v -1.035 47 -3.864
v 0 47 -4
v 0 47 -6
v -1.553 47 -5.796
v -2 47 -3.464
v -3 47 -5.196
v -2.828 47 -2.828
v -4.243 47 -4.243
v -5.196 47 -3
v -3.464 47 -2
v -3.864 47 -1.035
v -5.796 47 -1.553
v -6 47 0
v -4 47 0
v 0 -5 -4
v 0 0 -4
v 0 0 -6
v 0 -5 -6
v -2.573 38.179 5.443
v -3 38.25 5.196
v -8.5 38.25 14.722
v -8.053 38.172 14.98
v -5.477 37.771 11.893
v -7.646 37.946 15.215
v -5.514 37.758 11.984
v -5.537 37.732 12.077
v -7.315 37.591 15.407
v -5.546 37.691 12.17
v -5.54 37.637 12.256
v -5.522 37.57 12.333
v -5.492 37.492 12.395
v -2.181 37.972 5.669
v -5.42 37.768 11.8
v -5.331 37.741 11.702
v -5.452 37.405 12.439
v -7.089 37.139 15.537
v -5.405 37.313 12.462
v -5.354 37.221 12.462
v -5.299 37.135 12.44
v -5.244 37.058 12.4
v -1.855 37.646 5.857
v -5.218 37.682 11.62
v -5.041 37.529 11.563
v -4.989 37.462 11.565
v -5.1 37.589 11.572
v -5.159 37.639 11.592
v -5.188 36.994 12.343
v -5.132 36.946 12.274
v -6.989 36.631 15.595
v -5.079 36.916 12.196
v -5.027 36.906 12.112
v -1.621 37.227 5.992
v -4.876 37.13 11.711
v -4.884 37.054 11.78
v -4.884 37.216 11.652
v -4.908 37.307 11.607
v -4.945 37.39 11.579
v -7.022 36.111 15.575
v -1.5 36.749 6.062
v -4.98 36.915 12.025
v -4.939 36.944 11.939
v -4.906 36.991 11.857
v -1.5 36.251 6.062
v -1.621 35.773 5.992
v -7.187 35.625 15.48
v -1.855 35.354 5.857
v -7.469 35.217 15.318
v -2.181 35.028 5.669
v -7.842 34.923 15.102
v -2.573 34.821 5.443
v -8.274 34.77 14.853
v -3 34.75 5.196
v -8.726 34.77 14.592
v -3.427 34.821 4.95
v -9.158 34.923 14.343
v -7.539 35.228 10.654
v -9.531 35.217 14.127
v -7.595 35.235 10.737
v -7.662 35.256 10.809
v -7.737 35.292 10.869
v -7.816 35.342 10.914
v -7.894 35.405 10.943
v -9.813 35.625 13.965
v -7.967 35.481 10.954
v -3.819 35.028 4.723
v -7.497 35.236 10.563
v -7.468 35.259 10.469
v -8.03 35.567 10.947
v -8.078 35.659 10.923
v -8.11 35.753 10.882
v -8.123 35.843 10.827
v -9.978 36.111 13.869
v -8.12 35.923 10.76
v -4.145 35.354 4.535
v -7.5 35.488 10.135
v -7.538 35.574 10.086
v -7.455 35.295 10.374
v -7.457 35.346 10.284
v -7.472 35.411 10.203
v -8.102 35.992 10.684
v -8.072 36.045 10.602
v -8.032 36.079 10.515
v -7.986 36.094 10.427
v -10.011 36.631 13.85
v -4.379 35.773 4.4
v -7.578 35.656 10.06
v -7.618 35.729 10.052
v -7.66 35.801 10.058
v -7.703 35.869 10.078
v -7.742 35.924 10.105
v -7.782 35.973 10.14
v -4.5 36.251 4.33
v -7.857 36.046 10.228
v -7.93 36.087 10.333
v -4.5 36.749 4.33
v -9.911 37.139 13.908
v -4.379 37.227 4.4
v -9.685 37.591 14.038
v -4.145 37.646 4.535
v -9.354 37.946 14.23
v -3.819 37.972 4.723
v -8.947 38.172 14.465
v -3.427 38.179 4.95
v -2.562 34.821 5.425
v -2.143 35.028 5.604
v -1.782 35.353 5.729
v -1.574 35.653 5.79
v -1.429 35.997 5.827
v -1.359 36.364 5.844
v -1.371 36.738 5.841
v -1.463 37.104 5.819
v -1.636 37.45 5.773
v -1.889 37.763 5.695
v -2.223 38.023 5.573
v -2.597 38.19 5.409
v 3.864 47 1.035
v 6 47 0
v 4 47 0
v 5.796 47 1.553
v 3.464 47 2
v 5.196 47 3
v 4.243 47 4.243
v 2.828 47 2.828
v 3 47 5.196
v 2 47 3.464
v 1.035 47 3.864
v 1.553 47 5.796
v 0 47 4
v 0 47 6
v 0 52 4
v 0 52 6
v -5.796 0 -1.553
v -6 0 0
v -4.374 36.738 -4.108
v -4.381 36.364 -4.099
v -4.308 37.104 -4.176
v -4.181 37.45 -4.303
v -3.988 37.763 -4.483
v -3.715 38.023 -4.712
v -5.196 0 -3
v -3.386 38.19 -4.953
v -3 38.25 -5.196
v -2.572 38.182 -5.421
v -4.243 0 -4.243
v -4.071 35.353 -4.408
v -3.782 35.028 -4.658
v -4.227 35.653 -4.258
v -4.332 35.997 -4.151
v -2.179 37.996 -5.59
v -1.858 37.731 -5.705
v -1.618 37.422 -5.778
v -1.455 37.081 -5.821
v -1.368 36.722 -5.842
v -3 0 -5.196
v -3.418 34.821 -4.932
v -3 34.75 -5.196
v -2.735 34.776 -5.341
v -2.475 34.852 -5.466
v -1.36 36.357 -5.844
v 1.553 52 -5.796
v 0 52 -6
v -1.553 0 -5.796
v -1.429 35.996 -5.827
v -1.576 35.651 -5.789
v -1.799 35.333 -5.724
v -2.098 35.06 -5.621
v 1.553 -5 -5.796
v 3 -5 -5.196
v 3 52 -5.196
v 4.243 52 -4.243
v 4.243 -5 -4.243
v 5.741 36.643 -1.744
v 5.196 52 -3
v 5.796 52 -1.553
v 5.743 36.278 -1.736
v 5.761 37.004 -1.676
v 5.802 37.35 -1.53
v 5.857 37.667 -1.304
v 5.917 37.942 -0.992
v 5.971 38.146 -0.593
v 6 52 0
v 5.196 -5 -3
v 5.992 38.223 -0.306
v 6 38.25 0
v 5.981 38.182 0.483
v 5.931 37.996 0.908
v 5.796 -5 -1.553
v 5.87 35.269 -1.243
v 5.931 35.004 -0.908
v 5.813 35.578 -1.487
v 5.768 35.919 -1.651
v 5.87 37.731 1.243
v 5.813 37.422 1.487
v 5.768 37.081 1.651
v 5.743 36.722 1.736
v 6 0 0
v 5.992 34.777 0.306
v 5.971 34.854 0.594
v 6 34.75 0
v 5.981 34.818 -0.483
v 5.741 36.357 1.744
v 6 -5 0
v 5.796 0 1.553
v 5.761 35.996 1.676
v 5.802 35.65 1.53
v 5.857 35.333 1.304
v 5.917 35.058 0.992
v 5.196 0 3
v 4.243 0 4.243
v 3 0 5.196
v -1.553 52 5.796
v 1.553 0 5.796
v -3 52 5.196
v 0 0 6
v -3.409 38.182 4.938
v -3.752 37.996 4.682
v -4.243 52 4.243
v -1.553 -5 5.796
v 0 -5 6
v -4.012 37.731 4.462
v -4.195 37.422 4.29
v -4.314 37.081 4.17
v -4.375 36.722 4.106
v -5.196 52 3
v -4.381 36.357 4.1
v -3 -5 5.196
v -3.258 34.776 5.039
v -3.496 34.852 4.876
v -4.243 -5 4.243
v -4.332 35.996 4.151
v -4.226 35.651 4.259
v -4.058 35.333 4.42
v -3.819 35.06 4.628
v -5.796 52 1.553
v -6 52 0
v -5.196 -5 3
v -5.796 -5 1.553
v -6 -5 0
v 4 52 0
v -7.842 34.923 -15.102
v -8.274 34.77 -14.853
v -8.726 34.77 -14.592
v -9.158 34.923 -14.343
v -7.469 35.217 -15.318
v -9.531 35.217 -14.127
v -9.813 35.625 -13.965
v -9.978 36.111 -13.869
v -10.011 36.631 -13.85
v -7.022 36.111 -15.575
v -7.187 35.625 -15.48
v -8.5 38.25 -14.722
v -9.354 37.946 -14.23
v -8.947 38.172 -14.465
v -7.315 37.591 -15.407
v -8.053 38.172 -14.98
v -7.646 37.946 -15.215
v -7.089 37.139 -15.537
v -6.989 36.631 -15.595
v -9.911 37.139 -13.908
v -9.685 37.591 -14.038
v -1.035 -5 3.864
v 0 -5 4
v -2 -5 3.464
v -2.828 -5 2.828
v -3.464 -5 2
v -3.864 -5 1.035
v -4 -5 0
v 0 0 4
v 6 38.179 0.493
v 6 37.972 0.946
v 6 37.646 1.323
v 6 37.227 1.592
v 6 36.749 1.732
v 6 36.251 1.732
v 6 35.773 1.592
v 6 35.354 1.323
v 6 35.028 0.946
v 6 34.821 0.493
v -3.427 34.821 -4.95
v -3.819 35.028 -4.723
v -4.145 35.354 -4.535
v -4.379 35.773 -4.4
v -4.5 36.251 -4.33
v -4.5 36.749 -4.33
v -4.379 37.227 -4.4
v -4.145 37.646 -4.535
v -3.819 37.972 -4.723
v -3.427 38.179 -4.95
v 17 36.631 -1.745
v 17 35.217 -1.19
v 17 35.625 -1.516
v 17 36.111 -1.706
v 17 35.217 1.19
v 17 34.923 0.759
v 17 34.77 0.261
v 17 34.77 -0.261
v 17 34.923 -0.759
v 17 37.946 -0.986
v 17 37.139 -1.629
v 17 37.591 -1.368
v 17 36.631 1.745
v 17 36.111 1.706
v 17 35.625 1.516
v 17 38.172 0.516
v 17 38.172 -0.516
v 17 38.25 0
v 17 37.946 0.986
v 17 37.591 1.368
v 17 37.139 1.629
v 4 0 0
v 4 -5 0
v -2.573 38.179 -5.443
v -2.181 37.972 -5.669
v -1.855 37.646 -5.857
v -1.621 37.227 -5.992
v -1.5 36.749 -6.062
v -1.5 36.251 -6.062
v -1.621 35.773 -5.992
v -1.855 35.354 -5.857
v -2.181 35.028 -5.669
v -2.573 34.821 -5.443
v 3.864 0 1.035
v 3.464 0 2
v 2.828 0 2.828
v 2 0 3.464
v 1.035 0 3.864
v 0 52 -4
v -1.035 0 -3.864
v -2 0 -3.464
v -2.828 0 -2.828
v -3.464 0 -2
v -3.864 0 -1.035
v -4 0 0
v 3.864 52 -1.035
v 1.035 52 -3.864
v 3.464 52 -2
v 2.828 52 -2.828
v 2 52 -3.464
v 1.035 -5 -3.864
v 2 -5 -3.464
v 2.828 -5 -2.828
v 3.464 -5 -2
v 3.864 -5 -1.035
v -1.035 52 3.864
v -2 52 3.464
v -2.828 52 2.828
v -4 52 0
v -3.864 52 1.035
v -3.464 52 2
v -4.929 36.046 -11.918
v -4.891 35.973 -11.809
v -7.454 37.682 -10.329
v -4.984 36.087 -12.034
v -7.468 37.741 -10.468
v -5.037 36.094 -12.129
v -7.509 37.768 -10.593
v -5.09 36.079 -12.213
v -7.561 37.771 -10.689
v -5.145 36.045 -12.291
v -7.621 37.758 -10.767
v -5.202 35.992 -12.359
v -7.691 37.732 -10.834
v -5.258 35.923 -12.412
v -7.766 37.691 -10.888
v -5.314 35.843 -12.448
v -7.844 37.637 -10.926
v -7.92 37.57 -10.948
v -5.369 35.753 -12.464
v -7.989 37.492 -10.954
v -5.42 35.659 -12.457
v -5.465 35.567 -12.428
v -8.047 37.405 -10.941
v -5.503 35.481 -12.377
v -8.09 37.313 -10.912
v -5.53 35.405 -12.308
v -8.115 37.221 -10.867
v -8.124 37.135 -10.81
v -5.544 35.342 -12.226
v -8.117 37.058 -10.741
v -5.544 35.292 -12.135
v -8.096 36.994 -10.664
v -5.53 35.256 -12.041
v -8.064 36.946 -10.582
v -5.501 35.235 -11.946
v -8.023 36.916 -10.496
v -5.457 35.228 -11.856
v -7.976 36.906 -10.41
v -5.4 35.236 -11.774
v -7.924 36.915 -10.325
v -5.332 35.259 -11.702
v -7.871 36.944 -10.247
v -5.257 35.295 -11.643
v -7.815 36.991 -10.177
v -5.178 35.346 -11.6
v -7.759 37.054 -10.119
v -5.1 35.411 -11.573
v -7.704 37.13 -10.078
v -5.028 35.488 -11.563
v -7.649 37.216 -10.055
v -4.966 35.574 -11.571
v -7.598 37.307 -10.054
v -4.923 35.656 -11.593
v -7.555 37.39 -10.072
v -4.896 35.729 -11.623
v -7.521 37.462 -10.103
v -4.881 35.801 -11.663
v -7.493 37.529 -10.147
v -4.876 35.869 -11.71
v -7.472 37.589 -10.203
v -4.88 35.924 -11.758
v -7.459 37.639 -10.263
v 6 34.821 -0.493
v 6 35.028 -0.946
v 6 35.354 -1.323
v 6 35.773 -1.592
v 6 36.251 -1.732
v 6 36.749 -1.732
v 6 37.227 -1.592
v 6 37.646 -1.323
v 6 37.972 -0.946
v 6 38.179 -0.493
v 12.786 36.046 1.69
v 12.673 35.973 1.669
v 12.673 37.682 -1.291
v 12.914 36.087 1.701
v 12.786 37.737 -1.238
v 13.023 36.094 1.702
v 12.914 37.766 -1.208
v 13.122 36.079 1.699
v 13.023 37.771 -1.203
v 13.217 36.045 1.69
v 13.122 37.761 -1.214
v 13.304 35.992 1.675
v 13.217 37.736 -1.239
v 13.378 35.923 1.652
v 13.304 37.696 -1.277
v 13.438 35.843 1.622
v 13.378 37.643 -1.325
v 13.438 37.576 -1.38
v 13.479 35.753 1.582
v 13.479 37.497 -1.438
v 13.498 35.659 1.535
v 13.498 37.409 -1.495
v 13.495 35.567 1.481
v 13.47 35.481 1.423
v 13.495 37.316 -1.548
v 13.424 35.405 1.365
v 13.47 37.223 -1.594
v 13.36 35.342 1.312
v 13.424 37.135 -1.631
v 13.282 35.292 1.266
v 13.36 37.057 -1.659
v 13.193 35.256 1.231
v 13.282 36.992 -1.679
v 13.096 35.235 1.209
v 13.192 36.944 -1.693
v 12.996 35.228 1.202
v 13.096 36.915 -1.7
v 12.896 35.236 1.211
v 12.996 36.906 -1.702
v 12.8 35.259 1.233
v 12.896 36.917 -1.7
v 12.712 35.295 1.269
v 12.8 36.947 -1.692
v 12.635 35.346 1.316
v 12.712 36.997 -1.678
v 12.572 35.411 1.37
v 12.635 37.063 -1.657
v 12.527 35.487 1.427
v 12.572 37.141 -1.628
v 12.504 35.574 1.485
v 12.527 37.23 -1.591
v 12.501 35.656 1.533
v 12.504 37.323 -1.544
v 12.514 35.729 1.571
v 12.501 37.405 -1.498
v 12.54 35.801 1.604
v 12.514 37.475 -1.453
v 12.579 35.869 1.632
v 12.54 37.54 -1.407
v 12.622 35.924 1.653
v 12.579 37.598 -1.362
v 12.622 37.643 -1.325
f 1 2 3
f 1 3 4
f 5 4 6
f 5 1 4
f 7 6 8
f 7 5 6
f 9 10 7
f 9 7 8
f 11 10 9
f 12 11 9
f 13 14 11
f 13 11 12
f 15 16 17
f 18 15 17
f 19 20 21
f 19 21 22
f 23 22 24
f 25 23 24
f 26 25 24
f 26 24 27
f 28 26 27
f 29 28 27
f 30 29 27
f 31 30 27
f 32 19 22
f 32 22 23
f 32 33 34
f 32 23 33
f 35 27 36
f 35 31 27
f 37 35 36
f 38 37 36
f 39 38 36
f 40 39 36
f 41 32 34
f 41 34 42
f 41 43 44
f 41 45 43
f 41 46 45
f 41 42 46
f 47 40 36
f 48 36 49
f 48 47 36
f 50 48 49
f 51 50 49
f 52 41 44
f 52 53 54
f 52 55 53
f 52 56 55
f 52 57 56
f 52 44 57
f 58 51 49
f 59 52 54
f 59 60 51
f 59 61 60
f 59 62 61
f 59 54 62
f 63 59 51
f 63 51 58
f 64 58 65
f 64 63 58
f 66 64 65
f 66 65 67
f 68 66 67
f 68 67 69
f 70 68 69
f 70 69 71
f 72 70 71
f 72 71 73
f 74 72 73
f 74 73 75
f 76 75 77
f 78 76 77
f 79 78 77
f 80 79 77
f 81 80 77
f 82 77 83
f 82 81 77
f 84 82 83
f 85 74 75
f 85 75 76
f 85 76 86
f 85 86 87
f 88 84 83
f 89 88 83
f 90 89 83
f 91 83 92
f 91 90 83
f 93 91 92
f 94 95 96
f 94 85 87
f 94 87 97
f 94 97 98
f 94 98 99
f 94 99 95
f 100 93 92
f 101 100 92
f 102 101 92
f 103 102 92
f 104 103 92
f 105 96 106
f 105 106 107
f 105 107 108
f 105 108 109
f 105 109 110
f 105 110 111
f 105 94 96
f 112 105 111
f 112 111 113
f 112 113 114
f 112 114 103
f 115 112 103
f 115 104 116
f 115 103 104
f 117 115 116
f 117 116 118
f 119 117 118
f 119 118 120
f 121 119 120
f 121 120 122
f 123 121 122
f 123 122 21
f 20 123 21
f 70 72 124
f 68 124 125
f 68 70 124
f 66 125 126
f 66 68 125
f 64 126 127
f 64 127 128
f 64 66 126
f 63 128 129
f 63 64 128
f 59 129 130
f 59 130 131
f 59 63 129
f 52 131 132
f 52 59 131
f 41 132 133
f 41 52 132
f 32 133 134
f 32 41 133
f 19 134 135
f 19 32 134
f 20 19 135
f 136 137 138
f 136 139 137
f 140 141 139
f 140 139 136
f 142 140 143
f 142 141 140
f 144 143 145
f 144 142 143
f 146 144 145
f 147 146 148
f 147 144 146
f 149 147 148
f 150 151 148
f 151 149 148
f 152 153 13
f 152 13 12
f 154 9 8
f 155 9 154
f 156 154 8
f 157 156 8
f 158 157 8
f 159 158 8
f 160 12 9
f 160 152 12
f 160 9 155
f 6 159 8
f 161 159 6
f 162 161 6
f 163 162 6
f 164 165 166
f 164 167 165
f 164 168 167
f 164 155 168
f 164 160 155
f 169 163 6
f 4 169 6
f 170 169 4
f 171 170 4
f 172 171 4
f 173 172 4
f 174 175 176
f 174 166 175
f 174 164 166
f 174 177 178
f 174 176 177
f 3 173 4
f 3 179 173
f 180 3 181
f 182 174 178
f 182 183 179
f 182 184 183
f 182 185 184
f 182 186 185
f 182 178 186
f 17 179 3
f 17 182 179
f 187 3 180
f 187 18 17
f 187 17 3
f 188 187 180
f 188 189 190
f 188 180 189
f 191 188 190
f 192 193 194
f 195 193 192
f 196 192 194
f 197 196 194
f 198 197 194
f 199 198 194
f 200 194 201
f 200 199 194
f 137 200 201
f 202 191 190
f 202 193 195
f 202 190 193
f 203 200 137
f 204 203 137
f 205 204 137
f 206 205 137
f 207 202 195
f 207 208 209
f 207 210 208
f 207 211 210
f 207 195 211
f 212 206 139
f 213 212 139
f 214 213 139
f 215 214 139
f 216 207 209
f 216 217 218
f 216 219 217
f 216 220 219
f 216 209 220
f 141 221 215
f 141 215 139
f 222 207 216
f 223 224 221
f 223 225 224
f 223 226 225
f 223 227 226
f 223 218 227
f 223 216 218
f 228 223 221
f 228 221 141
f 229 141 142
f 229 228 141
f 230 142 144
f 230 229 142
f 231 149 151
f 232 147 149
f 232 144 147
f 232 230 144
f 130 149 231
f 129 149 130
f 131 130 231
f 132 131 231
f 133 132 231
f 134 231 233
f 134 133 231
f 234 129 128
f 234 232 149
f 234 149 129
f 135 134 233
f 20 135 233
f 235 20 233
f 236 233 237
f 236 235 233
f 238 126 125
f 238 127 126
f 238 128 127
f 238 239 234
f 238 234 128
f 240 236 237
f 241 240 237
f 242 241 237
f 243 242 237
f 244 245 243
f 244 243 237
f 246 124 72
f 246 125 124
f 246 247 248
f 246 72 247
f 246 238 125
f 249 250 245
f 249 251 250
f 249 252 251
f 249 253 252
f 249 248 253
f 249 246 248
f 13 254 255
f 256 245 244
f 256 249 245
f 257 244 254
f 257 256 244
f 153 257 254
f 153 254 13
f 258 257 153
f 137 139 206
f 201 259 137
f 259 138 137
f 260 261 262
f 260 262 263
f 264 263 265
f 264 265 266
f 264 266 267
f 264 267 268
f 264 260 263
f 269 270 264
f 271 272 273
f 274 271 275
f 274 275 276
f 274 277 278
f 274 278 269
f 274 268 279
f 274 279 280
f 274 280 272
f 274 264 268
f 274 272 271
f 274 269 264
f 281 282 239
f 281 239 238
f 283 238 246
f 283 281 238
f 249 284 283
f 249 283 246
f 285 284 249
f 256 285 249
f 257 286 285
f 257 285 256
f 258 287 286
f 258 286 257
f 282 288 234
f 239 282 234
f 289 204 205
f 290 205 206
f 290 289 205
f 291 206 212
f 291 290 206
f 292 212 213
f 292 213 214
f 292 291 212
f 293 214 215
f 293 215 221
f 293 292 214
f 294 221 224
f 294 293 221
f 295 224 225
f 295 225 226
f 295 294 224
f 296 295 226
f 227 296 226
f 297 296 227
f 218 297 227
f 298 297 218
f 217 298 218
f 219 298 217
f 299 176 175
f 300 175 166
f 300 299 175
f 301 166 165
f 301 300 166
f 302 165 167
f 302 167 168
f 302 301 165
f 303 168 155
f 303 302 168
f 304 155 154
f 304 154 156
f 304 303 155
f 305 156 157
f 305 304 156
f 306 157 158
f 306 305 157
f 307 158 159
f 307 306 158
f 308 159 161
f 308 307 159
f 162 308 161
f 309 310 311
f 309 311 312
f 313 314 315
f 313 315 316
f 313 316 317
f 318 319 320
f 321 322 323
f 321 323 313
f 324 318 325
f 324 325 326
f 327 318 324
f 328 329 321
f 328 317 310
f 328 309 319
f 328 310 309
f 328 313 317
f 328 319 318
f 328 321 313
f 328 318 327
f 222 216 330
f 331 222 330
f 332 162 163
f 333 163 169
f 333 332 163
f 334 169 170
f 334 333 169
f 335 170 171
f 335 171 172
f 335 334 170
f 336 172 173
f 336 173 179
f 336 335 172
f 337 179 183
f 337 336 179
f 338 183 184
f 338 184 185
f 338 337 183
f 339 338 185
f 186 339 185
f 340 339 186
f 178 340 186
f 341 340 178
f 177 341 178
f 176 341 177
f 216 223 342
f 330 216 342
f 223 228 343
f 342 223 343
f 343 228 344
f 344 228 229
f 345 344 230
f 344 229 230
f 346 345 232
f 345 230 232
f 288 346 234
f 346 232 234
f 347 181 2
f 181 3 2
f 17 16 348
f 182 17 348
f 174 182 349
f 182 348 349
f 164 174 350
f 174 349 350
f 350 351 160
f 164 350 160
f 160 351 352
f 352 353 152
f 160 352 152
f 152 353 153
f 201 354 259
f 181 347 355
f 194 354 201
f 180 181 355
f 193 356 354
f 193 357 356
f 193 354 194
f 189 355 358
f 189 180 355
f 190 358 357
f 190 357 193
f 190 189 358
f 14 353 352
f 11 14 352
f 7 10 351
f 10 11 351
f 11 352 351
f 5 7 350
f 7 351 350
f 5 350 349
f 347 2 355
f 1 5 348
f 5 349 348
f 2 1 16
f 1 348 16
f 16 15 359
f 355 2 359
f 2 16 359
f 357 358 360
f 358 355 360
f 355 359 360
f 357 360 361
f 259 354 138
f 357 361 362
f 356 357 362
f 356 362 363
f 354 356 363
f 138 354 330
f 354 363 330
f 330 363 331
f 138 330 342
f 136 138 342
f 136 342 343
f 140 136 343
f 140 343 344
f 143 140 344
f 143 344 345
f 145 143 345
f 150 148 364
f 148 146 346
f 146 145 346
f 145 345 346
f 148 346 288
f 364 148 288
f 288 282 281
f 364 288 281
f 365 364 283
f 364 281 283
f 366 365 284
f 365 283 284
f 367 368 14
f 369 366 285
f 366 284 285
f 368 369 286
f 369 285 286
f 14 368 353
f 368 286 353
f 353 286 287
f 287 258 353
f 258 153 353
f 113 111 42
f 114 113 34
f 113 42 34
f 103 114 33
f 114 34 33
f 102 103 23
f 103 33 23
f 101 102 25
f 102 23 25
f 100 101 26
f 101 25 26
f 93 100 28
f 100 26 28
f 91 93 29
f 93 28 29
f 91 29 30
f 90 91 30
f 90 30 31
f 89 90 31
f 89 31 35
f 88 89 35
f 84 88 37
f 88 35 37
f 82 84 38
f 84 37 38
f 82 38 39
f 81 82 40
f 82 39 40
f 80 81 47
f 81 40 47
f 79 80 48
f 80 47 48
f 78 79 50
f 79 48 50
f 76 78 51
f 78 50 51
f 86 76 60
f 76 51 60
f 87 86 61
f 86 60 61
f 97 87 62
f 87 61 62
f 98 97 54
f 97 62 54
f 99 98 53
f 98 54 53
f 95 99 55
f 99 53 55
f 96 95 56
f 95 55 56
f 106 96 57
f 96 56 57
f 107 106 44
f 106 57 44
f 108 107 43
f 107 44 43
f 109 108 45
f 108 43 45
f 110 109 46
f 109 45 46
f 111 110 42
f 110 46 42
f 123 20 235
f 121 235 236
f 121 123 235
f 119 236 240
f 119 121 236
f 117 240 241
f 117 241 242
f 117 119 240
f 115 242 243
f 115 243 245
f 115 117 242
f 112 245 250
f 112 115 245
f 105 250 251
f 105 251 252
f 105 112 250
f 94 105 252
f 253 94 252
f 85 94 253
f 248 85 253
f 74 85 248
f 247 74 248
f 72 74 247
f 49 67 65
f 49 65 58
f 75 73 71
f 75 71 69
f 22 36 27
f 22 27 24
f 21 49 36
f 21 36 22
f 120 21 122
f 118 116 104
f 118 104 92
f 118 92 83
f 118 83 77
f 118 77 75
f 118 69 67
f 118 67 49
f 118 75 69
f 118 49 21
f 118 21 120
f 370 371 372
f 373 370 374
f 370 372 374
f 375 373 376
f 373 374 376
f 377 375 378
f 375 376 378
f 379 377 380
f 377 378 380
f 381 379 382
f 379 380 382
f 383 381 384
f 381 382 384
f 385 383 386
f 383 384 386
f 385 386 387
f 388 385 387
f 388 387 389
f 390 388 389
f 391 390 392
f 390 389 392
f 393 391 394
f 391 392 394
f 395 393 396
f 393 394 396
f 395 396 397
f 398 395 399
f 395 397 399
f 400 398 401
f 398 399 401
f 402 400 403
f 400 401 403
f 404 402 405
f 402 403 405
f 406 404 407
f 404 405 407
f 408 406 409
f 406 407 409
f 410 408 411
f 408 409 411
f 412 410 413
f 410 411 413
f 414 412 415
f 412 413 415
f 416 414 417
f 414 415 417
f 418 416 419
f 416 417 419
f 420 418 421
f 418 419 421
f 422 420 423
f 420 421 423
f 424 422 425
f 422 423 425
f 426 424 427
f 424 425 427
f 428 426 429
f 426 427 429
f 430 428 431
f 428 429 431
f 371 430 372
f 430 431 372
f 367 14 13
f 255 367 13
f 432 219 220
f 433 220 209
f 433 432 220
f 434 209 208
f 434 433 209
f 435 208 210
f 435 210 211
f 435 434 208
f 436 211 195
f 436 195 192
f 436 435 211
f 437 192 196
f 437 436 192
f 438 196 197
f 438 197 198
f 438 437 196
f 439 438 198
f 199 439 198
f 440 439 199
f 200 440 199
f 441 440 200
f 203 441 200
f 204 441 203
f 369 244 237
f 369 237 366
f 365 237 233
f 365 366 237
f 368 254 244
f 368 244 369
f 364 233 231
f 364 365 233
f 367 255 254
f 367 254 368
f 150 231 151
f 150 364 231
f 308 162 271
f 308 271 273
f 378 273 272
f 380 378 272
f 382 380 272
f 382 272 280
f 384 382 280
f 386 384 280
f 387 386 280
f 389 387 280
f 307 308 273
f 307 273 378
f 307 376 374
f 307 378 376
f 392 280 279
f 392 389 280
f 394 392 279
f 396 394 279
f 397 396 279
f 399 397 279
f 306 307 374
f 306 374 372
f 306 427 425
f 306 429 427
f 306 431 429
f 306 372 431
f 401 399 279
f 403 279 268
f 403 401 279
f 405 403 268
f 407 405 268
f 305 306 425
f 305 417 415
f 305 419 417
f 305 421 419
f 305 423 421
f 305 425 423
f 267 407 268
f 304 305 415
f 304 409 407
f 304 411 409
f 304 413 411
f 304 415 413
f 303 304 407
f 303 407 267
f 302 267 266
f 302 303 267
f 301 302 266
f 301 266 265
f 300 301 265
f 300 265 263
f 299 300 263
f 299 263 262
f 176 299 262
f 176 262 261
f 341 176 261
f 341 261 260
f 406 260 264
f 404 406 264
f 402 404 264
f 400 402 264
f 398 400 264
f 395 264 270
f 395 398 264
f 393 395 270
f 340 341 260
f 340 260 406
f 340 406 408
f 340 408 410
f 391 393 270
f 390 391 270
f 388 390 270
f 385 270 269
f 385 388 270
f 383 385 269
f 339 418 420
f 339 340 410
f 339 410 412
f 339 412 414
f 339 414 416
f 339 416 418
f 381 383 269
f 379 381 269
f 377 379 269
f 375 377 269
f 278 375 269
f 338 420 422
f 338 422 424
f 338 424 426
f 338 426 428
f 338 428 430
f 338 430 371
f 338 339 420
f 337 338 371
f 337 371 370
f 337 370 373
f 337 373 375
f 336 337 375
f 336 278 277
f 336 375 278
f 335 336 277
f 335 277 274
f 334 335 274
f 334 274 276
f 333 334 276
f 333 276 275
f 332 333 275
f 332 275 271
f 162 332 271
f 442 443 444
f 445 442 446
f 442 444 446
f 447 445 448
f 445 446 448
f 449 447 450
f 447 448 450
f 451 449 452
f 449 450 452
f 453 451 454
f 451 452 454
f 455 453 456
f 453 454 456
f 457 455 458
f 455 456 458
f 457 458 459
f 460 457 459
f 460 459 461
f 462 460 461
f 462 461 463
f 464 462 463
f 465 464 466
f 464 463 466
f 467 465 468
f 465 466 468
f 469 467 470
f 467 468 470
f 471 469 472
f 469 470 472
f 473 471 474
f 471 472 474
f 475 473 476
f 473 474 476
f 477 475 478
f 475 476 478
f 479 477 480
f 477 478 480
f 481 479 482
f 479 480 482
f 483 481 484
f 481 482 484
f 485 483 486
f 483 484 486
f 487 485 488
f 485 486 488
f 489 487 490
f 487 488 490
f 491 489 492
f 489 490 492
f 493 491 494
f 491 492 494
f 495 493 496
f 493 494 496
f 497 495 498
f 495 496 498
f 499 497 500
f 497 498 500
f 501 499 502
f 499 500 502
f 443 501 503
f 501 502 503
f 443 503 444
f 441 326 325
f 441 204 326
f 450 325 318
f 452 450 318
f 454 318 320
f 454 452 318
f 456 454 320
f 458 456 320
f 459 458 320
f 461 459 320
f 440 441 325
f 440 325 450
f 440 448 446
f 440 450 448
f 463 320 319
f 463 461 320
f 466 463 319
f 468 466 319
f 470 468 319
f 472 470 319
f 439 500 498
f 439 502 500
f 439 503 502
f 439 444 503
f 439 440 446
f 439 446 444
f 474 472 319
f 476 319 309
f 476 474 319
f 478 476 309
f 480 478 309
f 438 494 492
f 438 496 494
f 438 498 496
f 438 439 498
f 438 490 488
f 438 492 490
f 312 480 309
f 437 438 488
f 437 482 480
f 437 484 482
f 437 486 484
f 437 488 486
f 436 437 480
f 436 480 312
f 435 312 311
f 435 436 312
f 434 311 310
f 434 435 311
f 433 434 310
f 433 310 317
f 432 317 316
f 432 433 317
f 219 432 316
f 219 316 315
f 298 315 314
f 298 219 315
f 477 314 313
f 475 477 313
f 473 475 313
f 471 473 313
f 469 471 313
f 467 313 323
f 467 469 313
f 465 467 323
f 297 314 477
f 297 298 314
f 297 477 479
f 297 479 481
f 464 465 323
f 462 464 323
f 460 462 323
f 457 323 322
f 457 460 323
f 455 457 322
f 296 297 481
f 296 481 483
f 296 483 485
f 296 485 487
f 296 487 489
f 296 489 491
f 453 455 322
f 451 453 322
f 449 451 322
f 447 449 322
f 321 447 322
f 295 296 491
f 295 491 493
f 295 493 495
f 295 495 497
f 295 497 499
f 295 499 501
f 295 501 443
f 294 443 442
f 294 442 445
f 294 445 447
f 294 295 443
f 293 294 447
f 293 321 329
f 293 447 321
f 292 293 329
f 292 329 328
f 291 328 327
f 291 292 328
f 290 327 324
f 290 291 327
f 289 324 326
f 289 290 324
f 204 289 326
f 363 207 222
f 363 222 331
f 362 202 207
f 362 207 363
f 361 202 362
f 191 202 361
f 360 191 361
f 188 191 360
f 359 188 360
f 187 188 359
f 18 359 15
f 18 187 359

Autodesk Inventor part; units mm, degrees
sketch "Sketch1" plane through (0, 0, 0) normal (0, 1, 0) x (-1, 0, 0)
  circle A0 centre (0, 0) radius 4
  circle A1 centre (0, 0) radius 6
  dimension "d0" = 8
  dimension "d1" = 12
extrude "Extrusion1" add sketch "Sketch1" along normal blind 47
sketch "Sketch2" plane through (0, 47, 0) normal (0, 1, 0) x (1, 0, 0)
  circle A0 centre (0, 0) radius 6 construction
  arc A1 (-6, 0) -> (0, -6) centre (0, 0) ccw
  circle A2 centre (0, 0) radius 4 construction
  arc A3 (-4, 0) -> (0, -4) centre (0, 0) ccw
  line L0 (0, -6) -> (0, -4)
  line L1 (-4, 0) -> (-6, 0)
  line L2 (4, 0) -> (6, 0)
  arc A4 (6, 0) -> (0, 6) centre (0, 0) ccw
  arc A5 (4, 0) -> (0, 4) centre (0, 0) ccw
  line L3 (0, 6) -> (0, 4)
  dimension "d6" = 360
extrude "Extrusion2" add sketch "Sketch2" along normal blind 5
ref_plane "Work Plane5" through (0, 37, 0) normal (0, -1, 0) x (1, 0, 0)
ref_plane "Work Plane1" through (0, 23.5, 0) normal (0, 1, 0) x (1, 0, 0)
mirror "Mirror1" about plane through (0, 23.5, 0) normal (0, 1, 0) of "Extrusion2"
sketch "Sketch3" plane through (0, 37, 0) normal (0, -1, 0) x (1, 0, 0)
  arc A0 (-6, 0) -> (0, -6) centre (0, 0) ccw construction
  line L0 (0, -6) -> (0, -4) construction
  arc A1 (-4, 0) -> (0, -4) centre (0, 0) ccw construction
  line L1 (-4, 0) -> (-6, 0) construction
  line L2 (-6, 0) -> (-4, 0) construction
  arc A2 (0, 4) -> (-4, 0) centre (0, 0) ccw construction
  line L3 (0, 4) -> (0, 6) construction
  arc A3 (0, 6) -> (-6, 0) centre (0, 0) ccw construction
  arc A4 (4, 0) -> (0, 4) centre (0, 0) ccw construction
  line L4 (4, 0) -> (6, 0) construction
  arc A5 (6, 0) -> (0, 6) centre (0, 0) ccw construction
  line L5 (0, 6) -> (0, 4) construction
  line L6 (0, -4) -> (0, -6) construction
  arc A6 (0, -6) -> (6, 0) centre (0, 0) ccw construction
  line L7 (6, 0) -> (4, 0) construction
  arc A7 (0, -4) -> (4, 0) centre (0, 0) ccw construction
  line L8 (6, 0) -> (11.7956, 0) construction
  line L9 (0, 0) -> (-6.4031, -11.0905) construction
  line L10 (0, 0) -> (-6.364, 11.0227) construction
  dimension "d10" = 120
  dimension "d11" = 120
ref_plane "Work Plane2" through (6, 37, 0) normal (1, 0, 0) x (0, 1, 0)
sketch "Sketch4" plane through (6, 37, 0) normal (1, 0, 0) x (0, 1, 0)
  line L0 (-42, -6) -> (-42, 0) construction
  circle A0 centre (-0.5, 0) radius 1.75
  point P0 (-37, 0)
  dimension "d12" = 41.5
  dimension "d38" = 3.5
extrude "Extrusion3" add sketch "Sketch4" along normal blind 11 and the other way blind 0.5
pattern_circular "Circular Pattern1" count 3 over 360 about axis through (0, 0, 0) along (0, 1, 0) of "Extrusion3"
thread "Thread1" size "M3.5x0.6" class "6g" standard "ANSI Metric M Profile" length 10
thread "Thread2" size "M3.5x0.6" class "6g" standard "ANSI Metric M Profile" length 10
thread "Thread3" size "M3.5x0.6" class "6g" standard "ANSI Metric M Profile" length 10
ref_plane "Work Plane3" through (-6.5, 36.5, 11.2583) normal (-0.5, 0, 0.866) x (0.866, 0, 0.5)
sketch "Sketch6" plane through (-6.5, 36.5, 11.2583) normal (-0.5, 0, 0.866) x (0.866, 0, 0.5)
  line L0 (0, 0) -> (-3.1225, -1.8028) construction
  line L1 (0, 0) -> (0, 3.8525) construction
  point P0 (0, -36.5)
  point P1 (-1.7321, -1)
  dimension "d27" = 120
ref_plane "Work Plane4" through (-8, 35.5, 10.3923) normal (-0.75, -0.5, -0.433) x (0.5547, -0.8321, 0)
sketch "Sketch7" plane through (-8, 35.5, 10.3923) normal (-0.75, -0.5, -0.433) x (0.5547, -0.8321, 0)
  point P0 (33.9754, -3.723)
  point P1 (0, 0)
hole "Hole1" at (-8, 35.5, 10.3923) direction (0.75, 0.5, 0.433) diameter 1 end through all
pattern_circular "Circular Pattern2" count 3 over 360 about axis through (0, 0, 0) along (0, 1, 0) of "Hole1"
properties part number "ObererRührerHalter"
